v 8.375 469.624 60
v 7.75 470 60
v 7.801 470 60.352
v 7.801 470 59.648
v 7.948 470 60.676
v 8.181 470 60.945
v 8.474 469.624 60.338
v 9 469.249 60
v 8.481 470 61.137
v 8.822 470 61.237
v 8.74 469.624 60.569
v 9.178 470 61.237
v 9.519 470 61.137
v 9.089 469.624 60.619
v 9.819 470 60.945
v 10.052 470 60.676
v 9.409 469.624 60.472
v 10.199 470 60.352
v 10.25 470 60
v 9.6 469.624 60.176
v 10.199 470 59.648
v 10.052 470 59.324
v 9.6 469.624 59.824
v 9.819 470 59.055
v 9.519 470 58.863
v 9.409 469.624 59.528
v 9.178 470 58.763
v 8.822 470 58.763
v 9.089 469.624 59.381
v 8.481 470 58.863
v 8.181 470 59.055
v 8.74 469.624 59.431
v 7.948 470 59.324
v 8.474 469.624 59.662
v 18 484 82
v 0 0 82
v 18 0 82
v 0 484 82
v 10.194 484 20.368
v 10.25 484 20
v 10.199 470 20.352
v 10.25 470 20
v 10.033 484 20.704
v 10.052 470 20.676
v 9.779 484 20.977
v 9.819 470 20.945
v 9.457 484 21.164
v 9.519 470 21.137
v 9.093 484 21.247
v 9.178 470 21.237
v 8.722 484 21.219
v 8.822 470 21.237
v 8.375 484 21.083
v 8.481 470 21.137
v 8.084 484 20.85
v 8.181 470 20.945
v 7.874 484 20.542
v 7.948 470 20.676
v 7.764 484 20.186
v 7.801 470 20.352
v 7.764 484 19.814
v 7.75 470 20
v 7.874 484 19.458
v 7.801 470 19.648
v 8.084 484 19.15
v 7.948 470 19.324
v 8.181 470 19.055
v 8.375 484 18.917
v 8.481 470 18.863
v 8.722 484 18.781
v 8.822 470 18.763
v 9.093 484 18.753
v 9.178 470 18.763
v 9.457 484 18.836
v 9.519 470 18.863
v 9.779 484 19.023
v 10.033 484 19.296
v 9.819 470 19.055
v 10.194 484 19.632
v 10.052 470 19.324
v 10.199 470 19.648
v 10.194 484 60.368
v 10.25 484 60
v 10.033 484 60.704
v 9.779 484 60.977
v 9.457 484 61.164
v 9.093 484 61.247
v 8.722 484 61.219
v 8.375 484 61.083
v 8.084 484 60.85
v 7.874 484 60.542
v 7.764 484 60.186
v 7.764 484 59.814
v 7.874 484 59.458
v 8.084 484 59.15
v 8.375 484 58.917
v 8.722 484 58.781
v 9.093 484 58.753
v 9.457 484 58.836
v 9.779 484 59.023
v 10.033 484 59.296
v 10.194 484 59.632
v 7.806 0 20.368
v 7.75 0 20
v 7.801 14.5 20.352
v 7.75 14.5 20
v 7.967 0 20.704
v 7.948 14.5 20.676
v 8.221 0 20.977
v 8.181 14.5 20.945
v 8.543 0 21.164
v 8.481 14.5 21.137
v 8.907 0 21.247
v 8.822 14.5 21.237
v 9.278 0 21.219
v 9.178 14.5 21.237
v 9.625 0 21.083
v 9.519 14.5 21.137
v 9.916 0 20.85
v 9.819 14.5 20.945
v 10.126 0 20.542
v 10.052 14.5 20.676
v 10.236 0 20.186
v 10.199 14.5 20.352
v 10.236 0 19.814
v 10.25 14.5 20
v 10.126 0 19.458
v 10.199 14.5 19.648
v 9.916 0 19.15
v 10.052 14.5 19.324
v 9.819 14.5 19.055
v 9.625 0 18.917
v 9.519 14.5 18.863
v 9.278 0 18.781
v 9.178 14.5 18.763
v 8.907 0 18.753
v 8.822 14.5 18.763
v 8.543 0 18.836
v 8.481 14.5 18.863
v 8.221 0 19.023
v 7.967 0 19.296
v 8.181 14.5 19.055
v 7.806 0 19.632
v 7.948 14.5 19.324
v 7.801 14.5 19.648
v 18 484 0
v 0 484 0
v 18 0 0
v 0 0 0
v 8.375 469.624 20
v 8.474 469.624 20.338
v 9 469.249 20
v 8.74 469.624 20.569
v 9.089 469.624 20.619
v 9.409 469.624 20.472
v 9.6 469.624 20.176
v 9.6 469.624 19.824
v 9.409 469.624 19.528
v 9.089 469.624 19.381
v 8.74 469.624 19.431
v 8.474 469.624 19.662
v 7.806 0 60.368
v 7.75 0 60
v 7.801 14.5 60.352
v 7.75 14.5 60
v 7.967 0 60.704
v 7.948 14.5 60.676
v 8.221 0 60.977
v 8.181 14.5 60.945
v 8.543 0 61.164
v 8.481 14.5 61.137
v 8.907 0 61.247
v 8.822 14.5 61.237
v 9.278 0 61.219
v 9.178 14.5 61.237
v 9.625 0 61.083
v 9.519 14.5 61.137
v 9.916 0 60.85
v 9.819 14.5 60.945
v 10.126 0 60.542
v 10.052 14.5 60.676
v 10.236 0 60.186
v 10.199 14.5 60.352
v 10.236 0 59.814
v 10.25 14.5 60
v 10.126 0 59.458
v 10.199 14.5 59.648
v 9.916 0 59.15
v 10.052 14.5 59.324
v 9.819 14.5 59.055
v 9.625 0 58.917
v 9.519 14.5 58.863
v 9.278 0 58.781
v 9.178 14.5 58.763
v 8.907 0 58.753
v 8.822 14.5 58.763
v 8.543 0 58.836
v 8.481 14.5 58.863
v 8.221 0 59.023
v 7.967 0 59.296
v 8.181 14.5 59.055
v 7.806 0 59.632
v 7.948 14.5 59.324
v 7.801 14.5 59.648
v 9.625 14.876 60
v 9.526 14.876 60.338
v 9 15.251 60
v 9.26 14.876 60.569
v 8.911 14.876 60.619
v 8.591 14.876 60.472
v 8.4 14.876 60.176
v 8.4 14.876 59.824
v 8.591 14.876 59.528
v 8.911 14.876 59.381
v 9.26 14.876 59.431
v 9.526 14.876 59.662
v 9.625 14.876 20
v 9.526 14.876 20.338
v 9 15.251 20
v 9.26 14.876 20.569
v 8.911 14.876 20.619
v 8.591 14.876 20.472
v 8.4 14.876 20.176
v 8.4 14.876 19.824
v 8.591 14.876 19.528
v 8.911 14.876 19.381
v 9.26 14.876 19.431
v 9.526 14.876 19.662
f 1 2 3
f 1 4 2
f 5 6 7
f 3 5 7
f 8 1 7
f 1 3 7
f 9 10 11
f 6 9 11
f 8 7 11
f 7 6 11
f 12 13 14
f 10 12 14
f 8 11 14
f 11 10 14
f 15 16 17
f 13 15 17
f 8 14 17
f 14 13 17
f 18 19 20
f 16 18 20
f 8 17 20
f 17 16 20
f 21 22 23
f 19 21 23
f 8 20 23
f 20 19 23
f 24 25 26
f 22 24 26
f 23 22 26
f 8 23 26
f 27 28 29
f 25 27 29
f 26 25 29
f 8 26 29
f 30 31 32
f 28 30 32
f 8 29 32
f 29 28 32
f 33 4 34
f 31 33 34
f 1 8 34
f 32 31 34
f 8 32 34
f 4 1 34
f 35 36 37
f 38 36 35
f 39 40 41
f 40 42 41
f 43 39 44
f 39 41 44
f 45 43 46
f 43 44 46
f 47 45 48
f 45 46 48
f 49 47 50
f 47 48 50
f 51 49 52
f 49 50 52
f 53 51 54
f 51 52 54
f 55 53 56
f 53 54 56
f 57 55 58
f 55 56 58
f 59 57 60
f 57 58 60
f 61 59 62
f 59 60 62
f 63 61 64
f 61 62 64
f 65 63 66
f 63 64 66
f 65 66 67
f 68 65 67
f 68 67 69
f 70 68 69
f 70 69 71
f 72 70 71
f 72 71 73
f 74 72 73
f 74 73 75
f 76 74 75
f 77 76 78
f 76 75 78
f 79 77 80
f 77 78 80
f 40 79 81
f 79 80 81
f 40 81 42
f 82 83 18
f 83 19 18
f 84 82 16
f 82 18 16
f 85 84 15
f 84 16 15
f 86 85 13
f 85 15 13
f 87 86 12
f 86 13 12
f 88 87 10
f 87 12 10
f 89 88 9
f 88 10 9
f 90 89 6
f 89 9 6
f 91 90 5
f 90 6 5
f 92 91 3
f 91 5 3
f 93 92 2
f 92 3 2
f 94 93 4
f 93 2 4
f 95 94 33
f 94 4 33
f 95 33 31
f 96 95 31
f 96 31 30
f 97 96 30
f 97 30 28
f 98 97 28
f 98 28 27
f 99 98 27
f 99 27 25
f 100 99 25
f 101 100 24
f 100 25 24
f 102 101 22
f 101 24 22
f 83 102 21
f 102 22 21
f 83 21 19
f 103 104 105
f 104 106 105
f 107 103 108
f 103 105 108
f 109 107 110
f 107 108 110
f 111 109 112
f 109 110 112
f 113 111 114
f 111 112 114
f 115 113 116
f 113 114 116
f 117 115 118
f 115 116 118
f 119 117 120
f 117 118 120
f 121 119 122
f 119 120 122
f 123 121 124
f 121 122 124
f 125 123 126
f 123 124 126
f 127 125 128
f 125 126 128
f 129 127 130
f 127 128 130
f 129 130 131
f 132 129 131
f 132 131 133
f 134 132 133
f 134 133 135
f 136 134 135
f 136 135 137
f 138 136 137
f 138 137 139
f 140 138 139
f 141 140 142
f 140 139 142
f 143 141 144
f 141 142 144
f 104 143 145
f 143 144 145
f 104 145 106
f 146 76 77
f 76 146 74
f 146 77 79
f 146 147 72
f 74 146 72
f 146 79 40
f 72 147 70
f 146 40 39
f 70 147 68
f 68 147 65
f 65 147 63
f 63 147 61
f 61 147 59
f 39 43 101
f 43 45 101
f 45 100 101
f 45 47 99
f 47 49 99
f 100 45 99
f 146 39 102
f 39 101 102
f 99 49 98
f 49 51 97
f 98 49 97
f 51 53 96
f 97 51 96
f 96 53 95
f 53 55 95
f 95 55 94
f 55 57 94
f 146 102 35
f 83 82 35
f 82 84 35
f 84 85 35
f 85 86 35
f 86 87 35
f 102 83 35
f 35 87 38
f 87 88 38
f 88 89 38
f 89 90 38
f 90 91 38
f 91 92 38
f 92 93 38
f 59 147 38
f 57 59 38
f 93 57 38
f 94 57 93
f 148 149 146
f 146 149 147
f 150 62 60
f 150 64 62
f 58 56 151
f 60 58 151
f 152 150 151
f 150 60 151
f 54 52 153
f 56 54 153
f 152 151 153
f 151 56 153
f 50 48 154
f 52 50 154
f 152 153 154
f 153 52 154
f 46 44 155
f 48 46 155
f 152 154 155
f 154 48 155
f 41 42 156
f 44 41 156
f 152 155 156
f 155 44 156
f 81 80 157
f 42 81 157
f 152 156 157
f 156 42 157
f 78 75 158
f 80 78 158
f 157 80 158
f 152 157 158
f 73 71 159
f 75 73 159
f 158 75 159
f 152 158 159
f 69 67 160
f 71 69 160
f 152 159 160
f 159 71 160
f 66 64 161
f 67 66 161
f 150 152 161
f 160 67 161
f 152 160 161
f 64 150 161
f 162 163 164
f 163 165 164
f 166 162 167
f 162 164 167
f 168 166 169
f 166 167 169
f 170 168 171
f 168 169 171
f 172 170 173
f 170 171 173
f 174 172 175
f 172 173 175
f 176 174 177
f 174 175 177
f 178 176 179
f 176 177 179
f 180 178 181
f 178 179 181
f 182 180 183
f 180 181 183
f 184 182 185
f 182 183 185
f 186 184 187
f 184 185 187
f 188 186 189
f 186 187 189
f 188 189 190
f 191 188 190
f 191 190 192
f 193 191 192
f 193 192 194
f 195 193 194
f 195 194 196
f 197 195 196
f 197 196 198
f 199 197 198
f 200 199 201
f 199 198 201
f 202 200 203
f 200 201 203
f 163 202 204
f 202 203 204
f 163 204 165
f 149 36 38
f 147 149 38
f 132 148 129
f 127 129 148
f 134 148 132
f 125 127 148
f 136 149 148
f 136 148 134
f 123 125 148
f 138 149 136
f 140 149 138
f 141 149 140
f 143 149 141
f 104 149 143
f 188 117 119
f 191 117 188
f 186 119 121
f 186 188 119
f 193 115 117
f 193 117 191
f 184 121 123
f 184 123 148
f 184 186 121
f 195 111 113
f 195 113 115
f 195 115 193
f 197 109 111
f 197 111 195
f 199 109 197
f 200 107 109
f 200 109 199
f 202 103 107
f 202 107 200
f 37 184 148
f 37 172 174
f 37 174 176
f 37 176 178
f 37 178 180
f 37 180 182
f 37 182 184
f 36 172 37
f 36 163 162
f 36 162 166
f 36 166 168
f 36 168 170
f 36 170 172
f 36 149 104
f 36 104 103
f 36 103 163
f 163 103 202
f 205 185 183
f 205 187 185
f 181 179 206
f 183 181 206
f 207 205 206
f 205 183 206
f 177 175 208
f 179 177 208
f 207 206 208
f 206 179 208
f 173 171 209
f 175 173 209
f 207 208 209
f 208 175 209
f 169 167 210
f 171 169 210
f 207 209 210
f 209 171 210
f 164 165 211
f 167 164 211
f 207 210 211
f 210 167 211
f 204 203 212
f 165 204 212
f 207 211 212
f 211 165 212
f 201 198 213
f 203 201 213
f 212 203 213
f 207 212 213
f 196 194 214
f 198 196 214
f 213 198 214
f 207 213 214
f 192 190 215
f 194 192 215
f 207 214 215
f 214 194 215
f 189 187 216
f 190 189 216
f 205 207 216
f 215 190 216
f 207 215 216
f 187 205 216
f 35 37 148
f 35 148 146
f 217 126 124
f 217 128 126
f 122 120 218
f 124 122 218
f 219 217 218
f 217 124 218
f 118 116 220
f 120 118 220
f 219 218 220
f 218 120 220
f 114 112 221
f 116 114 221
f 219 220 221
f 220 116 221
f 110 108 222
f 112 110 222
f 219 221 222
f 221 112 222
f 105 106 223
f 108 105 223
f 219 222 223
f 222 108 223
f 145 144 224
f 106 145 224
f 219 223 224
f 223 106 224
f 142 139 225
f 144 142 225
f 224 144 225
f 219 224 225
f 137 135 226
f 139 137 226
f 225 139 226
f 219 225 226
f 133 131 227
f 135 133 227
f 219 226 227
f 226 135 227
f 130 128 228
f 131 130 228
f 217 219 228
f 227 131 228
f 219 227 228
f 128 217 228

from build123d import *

# Parameters (mm, degrees)
F0_W     = 484
F0_H     = 82
F1_DEPTH = 18
F3_D     = 2.5
F3_DEPTH = 14.5
F3_TIP   = 0.7510757738
F5_D     = 2.5
F5_DEPTH = 14
F5_TIP   = 0.7510757738


with BuildPart() as f1:
    # F0 (on Right) → F1 (new body)
    with BuildSketch(Plane.YZ):
        with Locations((242, 41)):
            Rectangle(F0_W, F0_H)
    extrude(amount=F1_DEPTH)

    # F3
    with Locations(Plane.XZ):
        with Locations((9, 20), (9, 60)):
            Hole(F3_D / 2, depth=F3_DEPTH)
            with Locations((0, 0, -(F3_DEPTH + F3_TIP / 2))):  # 118° drill point
                Cone(0, F3_D / 2, F3_TIP, mode=Mode.SUBTRACT)

    # F5
    with Locations(Plane(origin=(0, 484, 0), x_dir=(-1, 0, 0), z_dir=(0, 1, 0))):
        with Locations((-9, 60), (-9, 20)):
            Hole(F5_D / 2, depth=F5_DEPTH)
            with Locations((0, 0, -(F5_DEPTH + F5_TIP / 2))):  # 118° drill point
                Cone(0, F5_D / 2, F5_TIP, mode=Mode.SUBTRACT)


solid = f1.part
